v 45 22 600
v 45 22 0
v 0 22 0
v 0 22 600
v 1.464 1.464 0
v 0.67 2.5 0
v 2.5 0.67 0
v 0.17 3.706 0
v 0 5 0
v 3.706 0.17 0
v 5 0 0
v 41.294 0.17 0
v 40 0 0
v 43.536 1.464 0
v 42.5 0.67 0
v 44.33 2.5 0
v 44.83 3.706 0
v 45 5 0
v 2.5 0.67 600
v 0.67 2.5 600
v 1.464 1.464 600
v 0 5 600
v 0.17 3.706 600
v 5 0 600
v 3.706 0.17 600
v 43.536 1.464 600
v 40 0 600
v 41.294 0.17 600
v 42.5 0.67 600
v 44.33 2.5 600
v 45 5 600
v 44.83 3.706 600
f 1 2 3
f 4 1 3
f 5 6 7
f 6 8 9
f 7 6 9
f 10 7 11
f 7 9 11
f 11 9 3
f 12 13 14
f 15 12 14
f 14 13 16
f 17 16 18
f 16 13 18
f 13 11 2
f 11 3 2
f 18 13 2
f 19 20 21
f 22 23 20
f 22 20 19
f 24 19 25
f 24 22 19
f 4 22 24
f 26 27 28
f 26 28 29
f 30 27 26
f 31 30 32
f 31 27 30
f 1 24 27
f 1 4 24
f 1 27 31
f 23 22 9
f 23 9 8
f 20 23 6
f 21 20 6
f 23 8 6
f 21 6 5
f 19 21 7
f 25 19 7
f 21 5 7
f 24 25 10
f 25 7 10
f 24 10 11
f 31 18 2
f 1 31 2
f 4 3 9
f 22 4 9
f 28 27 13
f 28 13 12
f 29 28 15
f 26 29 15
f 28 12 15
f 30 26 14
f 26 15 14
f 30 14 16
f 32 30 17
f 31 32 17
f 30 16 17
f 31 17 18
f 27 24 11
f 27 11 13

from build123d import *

# Parameters (mm, degrees)
F1_DEPTH = 600


with BuildPart() as f1:
    # F0 (on Top) → F1 (new body)
    with BuildSketch(Plane.XY):
        with BuildLine():
            ThreePointArc((0, 5), (1.464466, 1.464466), (5, 0))
            Line((5, 0), (40, 0))
            ThreePointArc((40, 0), (43.535534, 1.464466), (45, 5))
            Line((45, 5), (45, 22))
            Line((45, 22), (0, 22))
            Line((0, 22), (0, 5))
        make_face()
    extrude(amount=F1_DEPTH)


solid = f1.part
